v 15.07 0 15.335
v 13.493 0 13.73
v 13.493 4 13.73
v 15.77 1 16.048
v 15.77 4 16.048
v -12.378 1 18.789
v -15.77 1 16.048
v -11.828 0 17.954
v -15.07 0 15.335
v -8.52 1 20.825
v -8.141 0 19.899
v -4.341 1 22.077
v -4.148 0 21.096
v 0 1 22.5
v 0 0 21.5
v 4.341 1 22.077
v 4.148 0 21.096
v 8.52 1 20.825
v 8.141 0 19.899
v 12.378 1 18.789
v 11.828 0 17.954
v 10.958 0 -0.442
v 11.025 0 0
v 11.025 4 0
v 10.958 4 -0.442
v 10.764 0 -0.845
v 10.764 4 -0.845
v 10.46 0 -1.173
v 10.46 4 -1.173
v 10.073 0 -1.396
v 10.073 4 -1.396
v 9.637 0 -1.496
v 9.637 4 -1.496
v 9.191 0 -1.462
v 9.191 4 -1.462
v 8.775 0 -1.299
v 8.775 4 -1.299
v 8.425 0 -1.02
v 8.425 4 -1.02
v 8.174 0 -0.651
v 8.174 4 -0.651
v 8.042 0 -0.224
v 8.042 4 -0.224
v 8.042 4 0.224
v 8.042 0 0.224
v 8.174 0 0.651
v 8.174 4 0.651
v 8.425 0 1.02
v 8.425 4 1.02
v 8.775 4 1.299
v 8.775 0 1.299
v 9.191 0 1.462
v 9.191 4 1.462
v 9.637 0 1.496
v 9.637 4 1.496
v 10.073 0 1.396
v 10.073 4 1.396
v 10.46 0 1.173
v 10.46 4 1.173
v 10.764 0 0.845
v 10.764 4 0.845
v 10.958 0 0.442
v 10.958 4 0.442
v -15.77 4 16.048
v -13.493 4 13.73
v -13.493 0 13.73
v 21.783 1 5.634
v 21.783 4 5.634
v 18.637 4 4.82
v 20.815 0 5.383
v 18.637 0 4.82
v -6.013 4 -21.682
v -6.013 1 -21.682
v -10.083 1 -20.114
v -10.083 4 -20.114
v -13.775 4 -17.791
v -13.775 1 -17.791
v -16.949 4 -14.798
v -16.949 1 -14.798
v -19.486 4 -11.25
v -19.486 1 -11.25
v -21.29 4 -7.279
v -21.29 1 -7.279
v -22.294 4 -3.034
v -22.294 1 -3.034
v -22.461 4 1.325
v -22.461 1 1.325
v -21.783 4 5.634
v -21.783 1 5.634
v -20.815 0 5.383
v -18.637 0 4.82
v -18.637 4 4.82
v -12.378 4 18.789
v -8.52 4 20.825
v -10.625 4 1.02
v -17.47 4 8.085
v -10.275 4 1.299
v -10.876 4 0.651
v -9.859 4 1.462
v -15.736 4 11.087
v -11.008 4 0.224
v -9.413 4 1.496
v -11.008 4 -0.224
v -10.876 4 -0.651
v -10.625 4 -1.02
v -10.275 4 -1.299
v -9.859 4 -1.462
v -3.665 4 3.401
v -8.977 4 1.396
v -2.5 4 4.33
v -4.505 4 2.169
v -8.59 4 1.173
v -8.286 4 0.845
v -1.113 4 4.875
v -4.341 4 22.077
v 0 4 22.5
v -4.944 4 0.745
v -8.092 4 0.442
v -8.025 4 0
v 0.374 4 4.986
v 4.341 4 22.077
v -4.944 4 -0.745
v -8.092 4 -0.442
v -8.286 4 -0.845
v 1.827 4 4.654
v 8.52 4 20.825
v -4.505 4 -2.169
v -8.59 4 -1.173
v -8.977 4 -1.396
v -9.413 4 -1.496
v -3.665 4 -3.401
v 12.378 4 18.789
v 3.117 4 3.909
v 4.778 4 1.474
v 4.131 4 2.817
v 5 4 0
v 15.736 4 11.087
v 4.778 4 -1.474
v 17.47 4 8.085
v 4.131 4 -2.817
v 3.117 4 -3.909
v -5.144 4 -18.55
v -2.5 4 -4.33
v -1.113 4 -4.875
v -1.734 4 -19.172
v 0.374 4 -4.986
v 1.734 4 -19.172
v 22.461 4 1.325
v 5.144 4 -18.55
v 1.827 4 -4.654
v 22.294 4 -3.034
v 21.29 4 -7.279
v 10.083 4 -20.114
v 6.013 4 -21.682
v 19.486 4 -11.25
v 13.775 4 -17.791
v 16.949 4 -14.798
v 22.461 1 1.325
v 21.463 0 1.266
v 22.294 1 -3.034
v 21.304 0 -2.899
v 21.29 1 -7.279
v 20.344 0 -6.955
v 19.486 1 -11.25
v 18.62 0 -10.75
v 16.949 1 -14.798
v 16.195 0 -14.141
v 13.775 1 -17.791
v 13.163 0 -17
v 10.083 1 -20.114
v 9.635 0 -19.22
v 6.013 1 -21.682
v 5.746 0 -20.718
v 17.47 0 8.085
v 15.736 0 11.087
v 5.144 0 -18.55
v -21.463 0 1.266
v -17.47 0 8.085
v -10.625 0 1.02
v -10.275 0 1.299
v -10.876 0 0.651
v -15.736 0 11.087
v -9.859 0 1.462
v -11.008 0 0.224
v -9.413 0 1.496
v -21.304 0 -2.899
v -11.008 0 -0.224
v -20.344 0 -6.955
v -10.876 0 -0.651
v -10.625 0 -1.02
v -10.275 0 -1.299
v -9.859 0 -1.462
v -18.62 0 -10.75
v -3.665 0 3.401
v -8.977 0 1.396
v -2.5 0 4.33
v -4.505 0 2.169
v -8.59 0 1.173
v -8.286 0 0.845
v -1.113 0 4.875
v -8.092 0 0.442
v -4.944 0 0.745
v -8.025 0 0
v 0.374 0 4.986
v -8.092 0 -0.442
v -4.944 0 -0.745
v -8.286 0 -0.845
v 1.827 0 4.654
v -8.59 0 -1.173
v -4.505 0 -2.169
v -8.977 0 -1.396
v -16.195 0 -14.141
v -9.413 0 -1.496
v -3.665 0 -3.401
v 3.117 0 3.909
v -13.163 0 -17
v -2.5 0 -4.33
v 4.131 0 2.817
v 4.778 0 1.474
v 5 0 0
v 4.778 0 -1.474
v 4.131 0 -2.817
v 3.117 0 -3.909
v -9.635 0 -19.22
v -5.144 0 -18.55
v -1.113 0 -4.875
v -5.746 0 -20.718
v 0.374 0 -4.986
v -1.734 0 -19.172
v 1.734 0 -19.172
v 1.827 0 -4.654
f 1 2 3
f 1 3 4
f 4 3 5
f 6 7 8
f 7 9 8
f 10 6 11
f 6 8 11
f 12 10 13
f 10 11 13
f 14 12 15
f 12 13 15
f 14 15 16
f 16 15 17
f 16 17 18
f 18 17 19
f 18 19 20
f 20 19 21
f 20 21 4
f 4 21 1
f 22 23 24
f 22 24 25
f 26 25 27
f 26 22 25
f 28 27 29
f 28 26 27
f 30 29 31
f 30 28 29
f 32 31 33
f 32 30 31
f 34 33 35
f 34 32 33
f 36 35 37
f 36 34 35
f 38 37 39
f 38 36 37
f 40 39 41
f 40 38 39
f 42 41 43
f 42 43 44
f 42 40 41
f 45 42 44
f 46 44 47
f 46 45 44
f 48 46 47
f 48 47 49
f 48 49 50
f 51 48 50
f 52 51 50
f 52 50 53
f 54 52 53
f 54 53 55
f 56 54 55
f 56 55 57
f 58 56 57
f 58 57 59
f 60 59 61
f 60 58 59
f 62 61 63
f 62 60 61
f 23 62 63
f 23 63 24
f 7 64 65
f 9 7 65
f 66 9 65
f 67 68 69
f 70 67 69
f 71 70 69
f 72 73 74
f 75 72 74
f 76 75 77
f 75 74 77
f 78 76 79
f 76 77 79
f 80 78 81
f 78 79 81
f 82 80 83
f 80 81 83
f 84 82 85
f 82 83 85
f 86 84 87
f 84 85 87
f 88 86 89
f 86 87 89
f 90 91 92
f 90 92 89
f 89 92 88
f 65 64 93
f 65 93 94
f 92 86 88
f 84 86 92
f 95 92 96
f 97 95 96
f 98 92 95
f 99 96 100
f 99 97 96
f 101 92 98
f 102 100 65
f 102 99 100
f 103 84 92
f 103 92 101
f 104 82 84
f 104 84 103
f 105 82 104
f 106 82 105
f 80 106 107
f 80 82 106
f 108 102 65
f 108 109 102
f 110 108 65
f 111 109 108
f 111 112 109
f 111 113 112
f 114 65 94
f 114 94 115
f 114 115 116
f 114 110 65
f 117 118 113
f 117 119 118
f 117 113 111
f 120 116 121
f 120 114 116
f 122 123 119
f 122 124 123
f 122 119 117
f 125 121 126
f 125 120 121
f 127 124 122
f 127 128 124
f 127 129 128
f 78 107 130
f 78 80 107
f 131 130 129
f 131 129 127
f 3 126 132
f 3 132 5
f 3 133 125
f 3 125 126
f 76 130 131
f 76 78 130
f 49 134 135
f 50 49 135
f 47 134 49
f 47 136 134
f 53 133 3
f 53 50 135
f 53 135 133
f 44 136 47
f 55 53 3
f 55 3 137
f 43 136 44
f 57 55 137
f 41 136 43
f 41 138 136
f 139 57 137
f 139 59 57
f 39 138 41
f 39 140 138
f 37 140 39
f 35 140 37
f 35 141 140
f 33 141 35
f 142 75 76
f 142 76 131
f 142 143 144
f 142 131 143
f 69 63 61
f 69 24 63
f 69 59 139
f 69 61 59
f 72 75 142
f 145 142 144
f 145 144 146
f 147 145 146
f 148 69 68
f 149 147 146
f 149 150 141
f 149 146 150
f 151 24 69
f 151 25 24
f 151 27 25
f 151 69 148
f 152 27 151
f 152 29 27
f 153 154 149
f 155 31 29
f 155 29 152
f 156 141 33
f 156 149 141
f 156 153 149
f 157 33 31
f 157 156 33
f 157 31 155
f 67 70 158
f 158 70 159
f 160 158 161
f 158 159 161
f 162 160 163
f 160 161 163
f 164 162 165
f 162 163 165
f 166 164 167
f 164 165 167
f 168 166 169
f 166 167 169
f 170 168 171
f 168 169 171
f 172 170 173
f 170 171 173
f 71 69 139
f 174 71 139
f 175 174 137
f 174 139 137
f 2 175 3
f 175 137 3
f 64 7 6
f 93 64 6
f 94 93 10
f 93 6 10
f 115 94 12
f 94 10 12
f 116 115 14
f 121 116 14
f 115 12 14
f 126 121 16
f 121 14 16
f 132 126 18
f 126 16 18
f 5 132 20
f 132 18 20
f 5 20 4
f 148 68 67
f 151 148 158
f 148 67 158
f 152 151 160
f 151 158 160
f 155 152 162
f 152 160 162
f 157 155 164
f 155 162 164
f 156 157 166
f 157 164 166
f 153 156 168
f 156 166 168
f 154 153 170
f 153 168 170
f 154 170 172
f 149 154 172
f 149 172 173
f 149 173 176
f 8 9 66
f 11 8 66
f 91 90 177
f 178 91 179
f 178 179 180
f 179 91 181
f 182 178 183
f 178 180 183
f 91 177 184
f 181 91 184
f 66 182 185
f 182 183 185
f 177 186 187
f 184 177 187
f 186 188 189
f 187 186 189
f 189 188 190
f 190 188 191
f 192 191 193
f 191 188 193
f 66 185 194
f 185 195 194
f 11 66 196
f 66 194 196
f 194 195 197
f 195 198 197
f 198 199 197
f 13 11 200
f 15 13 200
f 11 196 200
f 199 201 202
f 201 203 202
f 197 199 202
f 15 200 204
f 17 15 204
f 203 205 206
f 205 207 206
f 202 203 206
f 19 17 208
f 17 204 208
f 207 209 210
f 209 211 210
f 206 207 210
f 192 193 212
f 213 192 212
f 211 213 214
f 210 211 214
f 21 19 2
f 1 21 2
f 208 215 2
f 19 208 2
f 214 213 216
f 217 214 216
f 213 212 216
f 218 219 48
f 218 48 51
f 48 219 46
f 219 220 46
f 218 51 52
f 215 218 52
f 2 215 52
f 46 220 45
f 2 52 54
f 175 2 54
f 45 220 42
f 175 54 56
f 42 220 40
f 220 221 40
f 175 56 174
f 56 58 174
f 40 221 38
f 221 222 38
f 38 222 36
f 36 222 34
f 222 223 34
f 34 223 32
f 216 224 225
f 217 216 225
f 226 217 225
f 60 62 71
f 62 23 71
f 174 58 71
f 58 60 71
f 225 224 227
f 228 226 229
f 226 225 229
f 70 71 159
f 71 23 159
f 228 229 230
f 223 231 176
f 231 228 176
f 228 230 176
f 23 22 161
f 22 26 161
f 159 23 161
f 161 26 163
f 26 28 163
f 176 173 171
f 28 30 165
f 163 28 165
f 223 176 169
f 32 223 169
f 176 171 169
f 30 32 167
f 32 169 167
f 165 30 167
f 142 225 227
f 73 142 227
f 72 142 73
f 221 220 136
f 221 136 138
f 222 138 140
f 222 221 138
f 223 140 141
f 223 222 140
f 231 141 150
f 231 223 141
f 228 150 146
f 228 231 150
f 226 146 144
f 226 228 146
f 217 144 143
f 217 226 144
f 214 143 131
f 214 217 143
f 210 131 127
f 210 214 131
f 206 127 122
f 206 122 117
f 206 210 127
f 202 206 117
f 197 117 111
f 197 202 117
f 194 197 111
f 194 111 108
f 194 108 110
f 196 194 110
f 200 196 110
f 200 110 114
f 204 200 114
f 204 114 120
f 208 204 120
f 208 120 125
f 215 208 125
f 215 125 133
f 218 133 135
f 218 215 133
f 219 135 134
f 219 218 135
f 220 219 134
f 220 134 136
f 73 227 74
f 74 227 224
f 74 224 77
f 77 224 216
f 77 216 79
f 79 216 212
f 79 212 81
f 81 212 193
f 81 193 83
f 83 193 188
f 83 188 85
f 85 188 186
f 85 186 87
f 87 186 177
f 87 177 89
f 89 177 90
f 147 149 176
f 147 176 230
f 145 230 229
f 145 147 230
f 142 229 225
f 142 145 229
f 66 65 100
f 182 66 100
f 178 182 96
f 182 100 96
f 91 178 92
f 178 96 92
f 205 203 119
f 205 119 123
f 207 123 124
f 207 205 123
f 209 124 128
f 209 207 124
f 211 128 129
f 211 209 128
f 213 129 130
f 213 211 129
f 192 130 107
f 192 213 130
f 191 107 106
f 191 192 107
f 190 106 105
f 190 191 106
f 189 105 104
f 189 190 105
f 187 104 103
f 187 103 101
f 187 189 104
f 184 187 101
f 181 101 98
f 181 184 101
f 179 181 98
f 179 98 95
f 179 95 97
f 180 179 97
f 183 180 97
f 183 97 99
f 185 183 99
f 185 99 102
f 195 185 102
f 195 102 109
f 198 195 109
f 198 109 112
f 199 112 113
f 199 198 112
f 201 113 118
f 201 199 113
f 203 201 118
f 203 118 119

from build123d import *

# Parameters (mm, degrees)
SKETCH1_R           = 22.5
SKETCH1_R_2         = 5
SKETCH1_R_3         = 1.5
BOSS_EXTRUDE1_DEPTH = 4
CHAMFER1_SIZE       = 1
CUT_EXTRUDE1_DEPTH  = 5


with BuildPart() as part:
    # Sketch1 → Boss-Extrude1 (new body)
    with BuildSketch(Plane(origin=(0, 0, 0), x_dir=(1, 0, 0), z_dir=(0, 1, 0))):
        Circle(SKETCH1_R)
        Circle(SKETCH1_R_2, mode=Mode.SUBTRACT)
        with Locations((-9.525, 0)):
            Circle(SKETCH1_R_3, mode=Mode.SUBTRACT)
        with Locations((9.525, 0)):
            Circle(SKETCH1_R_3, mode=Mode.SUBTRACT)
    extrude(amount=BOSS_EXTRUDE1_DEPTH)

    # Chamfer1
    chamfer1_edges = [part.edges().sort_by_distance(p)[0] for p in [
        (-22.5, 0, 0),
    ]]
    chamfer(chamfer1_edges, length=CHAMFER1_SIZE)

    # Sketch2 → Cut-Extrude1 (cut, through all)
    with BuildSketch(Plane(origin=(0, 4, 0), x_dir=(1, 0, 0), z_dir=(0, 1, 0))):
        with BuildLine():
            Line((6.012863462, 21.681685197), (5.14433874, 18.549886224))
            ThreePointArc((5.14433874, 18.549886224), (0, 19.25), (-5.14433874, 18.549886224))
            Line((-5.14433874, 18.549886224), (-6.012863462, 21.681685197))
            ThreePointArc((-6.012863462, 21.681685197), (0, 22.5), (6.012863462, 21.681685197))
        make_face()
        with BuildLine():
            Line((21.783321909, -5.633550091), (18.636842077, -4.819815078))
            ThreePointArc((18.636842077, -4.819815078), (16.670989023, -9.625), (13.492503338, -13.730071146))
            Line((13.492503338, -13.730071146), (15.770458447, -16.048135106))
            ThreePointArc((15.770458447, -16.048135106), (19.485571585, -11.25), (21.783321909, -5.633550091))
        make_face()
        with BuildLine():
            Line((-15.770458447, -16.048135106), (-13.492503338, -13.730071146))
            ThreePointArc((-13.492503338, -13.730071146), (-16.670989023, -9.625), (-18.636842077, -4.819815078))
            Line((-18.636842077, -4.819815078), (-21.783321909, -5.633550091))
            ThreePointArc((-21.783321909, -5.633550091), (-19.485571585, -11.25), (-15.770458447, -16.048135106))
        make_face()
    extrude(amount=-CUT_EXTRUDE1_DEPTH, mode=Mode.SUBTRACT)


solid = part.part
